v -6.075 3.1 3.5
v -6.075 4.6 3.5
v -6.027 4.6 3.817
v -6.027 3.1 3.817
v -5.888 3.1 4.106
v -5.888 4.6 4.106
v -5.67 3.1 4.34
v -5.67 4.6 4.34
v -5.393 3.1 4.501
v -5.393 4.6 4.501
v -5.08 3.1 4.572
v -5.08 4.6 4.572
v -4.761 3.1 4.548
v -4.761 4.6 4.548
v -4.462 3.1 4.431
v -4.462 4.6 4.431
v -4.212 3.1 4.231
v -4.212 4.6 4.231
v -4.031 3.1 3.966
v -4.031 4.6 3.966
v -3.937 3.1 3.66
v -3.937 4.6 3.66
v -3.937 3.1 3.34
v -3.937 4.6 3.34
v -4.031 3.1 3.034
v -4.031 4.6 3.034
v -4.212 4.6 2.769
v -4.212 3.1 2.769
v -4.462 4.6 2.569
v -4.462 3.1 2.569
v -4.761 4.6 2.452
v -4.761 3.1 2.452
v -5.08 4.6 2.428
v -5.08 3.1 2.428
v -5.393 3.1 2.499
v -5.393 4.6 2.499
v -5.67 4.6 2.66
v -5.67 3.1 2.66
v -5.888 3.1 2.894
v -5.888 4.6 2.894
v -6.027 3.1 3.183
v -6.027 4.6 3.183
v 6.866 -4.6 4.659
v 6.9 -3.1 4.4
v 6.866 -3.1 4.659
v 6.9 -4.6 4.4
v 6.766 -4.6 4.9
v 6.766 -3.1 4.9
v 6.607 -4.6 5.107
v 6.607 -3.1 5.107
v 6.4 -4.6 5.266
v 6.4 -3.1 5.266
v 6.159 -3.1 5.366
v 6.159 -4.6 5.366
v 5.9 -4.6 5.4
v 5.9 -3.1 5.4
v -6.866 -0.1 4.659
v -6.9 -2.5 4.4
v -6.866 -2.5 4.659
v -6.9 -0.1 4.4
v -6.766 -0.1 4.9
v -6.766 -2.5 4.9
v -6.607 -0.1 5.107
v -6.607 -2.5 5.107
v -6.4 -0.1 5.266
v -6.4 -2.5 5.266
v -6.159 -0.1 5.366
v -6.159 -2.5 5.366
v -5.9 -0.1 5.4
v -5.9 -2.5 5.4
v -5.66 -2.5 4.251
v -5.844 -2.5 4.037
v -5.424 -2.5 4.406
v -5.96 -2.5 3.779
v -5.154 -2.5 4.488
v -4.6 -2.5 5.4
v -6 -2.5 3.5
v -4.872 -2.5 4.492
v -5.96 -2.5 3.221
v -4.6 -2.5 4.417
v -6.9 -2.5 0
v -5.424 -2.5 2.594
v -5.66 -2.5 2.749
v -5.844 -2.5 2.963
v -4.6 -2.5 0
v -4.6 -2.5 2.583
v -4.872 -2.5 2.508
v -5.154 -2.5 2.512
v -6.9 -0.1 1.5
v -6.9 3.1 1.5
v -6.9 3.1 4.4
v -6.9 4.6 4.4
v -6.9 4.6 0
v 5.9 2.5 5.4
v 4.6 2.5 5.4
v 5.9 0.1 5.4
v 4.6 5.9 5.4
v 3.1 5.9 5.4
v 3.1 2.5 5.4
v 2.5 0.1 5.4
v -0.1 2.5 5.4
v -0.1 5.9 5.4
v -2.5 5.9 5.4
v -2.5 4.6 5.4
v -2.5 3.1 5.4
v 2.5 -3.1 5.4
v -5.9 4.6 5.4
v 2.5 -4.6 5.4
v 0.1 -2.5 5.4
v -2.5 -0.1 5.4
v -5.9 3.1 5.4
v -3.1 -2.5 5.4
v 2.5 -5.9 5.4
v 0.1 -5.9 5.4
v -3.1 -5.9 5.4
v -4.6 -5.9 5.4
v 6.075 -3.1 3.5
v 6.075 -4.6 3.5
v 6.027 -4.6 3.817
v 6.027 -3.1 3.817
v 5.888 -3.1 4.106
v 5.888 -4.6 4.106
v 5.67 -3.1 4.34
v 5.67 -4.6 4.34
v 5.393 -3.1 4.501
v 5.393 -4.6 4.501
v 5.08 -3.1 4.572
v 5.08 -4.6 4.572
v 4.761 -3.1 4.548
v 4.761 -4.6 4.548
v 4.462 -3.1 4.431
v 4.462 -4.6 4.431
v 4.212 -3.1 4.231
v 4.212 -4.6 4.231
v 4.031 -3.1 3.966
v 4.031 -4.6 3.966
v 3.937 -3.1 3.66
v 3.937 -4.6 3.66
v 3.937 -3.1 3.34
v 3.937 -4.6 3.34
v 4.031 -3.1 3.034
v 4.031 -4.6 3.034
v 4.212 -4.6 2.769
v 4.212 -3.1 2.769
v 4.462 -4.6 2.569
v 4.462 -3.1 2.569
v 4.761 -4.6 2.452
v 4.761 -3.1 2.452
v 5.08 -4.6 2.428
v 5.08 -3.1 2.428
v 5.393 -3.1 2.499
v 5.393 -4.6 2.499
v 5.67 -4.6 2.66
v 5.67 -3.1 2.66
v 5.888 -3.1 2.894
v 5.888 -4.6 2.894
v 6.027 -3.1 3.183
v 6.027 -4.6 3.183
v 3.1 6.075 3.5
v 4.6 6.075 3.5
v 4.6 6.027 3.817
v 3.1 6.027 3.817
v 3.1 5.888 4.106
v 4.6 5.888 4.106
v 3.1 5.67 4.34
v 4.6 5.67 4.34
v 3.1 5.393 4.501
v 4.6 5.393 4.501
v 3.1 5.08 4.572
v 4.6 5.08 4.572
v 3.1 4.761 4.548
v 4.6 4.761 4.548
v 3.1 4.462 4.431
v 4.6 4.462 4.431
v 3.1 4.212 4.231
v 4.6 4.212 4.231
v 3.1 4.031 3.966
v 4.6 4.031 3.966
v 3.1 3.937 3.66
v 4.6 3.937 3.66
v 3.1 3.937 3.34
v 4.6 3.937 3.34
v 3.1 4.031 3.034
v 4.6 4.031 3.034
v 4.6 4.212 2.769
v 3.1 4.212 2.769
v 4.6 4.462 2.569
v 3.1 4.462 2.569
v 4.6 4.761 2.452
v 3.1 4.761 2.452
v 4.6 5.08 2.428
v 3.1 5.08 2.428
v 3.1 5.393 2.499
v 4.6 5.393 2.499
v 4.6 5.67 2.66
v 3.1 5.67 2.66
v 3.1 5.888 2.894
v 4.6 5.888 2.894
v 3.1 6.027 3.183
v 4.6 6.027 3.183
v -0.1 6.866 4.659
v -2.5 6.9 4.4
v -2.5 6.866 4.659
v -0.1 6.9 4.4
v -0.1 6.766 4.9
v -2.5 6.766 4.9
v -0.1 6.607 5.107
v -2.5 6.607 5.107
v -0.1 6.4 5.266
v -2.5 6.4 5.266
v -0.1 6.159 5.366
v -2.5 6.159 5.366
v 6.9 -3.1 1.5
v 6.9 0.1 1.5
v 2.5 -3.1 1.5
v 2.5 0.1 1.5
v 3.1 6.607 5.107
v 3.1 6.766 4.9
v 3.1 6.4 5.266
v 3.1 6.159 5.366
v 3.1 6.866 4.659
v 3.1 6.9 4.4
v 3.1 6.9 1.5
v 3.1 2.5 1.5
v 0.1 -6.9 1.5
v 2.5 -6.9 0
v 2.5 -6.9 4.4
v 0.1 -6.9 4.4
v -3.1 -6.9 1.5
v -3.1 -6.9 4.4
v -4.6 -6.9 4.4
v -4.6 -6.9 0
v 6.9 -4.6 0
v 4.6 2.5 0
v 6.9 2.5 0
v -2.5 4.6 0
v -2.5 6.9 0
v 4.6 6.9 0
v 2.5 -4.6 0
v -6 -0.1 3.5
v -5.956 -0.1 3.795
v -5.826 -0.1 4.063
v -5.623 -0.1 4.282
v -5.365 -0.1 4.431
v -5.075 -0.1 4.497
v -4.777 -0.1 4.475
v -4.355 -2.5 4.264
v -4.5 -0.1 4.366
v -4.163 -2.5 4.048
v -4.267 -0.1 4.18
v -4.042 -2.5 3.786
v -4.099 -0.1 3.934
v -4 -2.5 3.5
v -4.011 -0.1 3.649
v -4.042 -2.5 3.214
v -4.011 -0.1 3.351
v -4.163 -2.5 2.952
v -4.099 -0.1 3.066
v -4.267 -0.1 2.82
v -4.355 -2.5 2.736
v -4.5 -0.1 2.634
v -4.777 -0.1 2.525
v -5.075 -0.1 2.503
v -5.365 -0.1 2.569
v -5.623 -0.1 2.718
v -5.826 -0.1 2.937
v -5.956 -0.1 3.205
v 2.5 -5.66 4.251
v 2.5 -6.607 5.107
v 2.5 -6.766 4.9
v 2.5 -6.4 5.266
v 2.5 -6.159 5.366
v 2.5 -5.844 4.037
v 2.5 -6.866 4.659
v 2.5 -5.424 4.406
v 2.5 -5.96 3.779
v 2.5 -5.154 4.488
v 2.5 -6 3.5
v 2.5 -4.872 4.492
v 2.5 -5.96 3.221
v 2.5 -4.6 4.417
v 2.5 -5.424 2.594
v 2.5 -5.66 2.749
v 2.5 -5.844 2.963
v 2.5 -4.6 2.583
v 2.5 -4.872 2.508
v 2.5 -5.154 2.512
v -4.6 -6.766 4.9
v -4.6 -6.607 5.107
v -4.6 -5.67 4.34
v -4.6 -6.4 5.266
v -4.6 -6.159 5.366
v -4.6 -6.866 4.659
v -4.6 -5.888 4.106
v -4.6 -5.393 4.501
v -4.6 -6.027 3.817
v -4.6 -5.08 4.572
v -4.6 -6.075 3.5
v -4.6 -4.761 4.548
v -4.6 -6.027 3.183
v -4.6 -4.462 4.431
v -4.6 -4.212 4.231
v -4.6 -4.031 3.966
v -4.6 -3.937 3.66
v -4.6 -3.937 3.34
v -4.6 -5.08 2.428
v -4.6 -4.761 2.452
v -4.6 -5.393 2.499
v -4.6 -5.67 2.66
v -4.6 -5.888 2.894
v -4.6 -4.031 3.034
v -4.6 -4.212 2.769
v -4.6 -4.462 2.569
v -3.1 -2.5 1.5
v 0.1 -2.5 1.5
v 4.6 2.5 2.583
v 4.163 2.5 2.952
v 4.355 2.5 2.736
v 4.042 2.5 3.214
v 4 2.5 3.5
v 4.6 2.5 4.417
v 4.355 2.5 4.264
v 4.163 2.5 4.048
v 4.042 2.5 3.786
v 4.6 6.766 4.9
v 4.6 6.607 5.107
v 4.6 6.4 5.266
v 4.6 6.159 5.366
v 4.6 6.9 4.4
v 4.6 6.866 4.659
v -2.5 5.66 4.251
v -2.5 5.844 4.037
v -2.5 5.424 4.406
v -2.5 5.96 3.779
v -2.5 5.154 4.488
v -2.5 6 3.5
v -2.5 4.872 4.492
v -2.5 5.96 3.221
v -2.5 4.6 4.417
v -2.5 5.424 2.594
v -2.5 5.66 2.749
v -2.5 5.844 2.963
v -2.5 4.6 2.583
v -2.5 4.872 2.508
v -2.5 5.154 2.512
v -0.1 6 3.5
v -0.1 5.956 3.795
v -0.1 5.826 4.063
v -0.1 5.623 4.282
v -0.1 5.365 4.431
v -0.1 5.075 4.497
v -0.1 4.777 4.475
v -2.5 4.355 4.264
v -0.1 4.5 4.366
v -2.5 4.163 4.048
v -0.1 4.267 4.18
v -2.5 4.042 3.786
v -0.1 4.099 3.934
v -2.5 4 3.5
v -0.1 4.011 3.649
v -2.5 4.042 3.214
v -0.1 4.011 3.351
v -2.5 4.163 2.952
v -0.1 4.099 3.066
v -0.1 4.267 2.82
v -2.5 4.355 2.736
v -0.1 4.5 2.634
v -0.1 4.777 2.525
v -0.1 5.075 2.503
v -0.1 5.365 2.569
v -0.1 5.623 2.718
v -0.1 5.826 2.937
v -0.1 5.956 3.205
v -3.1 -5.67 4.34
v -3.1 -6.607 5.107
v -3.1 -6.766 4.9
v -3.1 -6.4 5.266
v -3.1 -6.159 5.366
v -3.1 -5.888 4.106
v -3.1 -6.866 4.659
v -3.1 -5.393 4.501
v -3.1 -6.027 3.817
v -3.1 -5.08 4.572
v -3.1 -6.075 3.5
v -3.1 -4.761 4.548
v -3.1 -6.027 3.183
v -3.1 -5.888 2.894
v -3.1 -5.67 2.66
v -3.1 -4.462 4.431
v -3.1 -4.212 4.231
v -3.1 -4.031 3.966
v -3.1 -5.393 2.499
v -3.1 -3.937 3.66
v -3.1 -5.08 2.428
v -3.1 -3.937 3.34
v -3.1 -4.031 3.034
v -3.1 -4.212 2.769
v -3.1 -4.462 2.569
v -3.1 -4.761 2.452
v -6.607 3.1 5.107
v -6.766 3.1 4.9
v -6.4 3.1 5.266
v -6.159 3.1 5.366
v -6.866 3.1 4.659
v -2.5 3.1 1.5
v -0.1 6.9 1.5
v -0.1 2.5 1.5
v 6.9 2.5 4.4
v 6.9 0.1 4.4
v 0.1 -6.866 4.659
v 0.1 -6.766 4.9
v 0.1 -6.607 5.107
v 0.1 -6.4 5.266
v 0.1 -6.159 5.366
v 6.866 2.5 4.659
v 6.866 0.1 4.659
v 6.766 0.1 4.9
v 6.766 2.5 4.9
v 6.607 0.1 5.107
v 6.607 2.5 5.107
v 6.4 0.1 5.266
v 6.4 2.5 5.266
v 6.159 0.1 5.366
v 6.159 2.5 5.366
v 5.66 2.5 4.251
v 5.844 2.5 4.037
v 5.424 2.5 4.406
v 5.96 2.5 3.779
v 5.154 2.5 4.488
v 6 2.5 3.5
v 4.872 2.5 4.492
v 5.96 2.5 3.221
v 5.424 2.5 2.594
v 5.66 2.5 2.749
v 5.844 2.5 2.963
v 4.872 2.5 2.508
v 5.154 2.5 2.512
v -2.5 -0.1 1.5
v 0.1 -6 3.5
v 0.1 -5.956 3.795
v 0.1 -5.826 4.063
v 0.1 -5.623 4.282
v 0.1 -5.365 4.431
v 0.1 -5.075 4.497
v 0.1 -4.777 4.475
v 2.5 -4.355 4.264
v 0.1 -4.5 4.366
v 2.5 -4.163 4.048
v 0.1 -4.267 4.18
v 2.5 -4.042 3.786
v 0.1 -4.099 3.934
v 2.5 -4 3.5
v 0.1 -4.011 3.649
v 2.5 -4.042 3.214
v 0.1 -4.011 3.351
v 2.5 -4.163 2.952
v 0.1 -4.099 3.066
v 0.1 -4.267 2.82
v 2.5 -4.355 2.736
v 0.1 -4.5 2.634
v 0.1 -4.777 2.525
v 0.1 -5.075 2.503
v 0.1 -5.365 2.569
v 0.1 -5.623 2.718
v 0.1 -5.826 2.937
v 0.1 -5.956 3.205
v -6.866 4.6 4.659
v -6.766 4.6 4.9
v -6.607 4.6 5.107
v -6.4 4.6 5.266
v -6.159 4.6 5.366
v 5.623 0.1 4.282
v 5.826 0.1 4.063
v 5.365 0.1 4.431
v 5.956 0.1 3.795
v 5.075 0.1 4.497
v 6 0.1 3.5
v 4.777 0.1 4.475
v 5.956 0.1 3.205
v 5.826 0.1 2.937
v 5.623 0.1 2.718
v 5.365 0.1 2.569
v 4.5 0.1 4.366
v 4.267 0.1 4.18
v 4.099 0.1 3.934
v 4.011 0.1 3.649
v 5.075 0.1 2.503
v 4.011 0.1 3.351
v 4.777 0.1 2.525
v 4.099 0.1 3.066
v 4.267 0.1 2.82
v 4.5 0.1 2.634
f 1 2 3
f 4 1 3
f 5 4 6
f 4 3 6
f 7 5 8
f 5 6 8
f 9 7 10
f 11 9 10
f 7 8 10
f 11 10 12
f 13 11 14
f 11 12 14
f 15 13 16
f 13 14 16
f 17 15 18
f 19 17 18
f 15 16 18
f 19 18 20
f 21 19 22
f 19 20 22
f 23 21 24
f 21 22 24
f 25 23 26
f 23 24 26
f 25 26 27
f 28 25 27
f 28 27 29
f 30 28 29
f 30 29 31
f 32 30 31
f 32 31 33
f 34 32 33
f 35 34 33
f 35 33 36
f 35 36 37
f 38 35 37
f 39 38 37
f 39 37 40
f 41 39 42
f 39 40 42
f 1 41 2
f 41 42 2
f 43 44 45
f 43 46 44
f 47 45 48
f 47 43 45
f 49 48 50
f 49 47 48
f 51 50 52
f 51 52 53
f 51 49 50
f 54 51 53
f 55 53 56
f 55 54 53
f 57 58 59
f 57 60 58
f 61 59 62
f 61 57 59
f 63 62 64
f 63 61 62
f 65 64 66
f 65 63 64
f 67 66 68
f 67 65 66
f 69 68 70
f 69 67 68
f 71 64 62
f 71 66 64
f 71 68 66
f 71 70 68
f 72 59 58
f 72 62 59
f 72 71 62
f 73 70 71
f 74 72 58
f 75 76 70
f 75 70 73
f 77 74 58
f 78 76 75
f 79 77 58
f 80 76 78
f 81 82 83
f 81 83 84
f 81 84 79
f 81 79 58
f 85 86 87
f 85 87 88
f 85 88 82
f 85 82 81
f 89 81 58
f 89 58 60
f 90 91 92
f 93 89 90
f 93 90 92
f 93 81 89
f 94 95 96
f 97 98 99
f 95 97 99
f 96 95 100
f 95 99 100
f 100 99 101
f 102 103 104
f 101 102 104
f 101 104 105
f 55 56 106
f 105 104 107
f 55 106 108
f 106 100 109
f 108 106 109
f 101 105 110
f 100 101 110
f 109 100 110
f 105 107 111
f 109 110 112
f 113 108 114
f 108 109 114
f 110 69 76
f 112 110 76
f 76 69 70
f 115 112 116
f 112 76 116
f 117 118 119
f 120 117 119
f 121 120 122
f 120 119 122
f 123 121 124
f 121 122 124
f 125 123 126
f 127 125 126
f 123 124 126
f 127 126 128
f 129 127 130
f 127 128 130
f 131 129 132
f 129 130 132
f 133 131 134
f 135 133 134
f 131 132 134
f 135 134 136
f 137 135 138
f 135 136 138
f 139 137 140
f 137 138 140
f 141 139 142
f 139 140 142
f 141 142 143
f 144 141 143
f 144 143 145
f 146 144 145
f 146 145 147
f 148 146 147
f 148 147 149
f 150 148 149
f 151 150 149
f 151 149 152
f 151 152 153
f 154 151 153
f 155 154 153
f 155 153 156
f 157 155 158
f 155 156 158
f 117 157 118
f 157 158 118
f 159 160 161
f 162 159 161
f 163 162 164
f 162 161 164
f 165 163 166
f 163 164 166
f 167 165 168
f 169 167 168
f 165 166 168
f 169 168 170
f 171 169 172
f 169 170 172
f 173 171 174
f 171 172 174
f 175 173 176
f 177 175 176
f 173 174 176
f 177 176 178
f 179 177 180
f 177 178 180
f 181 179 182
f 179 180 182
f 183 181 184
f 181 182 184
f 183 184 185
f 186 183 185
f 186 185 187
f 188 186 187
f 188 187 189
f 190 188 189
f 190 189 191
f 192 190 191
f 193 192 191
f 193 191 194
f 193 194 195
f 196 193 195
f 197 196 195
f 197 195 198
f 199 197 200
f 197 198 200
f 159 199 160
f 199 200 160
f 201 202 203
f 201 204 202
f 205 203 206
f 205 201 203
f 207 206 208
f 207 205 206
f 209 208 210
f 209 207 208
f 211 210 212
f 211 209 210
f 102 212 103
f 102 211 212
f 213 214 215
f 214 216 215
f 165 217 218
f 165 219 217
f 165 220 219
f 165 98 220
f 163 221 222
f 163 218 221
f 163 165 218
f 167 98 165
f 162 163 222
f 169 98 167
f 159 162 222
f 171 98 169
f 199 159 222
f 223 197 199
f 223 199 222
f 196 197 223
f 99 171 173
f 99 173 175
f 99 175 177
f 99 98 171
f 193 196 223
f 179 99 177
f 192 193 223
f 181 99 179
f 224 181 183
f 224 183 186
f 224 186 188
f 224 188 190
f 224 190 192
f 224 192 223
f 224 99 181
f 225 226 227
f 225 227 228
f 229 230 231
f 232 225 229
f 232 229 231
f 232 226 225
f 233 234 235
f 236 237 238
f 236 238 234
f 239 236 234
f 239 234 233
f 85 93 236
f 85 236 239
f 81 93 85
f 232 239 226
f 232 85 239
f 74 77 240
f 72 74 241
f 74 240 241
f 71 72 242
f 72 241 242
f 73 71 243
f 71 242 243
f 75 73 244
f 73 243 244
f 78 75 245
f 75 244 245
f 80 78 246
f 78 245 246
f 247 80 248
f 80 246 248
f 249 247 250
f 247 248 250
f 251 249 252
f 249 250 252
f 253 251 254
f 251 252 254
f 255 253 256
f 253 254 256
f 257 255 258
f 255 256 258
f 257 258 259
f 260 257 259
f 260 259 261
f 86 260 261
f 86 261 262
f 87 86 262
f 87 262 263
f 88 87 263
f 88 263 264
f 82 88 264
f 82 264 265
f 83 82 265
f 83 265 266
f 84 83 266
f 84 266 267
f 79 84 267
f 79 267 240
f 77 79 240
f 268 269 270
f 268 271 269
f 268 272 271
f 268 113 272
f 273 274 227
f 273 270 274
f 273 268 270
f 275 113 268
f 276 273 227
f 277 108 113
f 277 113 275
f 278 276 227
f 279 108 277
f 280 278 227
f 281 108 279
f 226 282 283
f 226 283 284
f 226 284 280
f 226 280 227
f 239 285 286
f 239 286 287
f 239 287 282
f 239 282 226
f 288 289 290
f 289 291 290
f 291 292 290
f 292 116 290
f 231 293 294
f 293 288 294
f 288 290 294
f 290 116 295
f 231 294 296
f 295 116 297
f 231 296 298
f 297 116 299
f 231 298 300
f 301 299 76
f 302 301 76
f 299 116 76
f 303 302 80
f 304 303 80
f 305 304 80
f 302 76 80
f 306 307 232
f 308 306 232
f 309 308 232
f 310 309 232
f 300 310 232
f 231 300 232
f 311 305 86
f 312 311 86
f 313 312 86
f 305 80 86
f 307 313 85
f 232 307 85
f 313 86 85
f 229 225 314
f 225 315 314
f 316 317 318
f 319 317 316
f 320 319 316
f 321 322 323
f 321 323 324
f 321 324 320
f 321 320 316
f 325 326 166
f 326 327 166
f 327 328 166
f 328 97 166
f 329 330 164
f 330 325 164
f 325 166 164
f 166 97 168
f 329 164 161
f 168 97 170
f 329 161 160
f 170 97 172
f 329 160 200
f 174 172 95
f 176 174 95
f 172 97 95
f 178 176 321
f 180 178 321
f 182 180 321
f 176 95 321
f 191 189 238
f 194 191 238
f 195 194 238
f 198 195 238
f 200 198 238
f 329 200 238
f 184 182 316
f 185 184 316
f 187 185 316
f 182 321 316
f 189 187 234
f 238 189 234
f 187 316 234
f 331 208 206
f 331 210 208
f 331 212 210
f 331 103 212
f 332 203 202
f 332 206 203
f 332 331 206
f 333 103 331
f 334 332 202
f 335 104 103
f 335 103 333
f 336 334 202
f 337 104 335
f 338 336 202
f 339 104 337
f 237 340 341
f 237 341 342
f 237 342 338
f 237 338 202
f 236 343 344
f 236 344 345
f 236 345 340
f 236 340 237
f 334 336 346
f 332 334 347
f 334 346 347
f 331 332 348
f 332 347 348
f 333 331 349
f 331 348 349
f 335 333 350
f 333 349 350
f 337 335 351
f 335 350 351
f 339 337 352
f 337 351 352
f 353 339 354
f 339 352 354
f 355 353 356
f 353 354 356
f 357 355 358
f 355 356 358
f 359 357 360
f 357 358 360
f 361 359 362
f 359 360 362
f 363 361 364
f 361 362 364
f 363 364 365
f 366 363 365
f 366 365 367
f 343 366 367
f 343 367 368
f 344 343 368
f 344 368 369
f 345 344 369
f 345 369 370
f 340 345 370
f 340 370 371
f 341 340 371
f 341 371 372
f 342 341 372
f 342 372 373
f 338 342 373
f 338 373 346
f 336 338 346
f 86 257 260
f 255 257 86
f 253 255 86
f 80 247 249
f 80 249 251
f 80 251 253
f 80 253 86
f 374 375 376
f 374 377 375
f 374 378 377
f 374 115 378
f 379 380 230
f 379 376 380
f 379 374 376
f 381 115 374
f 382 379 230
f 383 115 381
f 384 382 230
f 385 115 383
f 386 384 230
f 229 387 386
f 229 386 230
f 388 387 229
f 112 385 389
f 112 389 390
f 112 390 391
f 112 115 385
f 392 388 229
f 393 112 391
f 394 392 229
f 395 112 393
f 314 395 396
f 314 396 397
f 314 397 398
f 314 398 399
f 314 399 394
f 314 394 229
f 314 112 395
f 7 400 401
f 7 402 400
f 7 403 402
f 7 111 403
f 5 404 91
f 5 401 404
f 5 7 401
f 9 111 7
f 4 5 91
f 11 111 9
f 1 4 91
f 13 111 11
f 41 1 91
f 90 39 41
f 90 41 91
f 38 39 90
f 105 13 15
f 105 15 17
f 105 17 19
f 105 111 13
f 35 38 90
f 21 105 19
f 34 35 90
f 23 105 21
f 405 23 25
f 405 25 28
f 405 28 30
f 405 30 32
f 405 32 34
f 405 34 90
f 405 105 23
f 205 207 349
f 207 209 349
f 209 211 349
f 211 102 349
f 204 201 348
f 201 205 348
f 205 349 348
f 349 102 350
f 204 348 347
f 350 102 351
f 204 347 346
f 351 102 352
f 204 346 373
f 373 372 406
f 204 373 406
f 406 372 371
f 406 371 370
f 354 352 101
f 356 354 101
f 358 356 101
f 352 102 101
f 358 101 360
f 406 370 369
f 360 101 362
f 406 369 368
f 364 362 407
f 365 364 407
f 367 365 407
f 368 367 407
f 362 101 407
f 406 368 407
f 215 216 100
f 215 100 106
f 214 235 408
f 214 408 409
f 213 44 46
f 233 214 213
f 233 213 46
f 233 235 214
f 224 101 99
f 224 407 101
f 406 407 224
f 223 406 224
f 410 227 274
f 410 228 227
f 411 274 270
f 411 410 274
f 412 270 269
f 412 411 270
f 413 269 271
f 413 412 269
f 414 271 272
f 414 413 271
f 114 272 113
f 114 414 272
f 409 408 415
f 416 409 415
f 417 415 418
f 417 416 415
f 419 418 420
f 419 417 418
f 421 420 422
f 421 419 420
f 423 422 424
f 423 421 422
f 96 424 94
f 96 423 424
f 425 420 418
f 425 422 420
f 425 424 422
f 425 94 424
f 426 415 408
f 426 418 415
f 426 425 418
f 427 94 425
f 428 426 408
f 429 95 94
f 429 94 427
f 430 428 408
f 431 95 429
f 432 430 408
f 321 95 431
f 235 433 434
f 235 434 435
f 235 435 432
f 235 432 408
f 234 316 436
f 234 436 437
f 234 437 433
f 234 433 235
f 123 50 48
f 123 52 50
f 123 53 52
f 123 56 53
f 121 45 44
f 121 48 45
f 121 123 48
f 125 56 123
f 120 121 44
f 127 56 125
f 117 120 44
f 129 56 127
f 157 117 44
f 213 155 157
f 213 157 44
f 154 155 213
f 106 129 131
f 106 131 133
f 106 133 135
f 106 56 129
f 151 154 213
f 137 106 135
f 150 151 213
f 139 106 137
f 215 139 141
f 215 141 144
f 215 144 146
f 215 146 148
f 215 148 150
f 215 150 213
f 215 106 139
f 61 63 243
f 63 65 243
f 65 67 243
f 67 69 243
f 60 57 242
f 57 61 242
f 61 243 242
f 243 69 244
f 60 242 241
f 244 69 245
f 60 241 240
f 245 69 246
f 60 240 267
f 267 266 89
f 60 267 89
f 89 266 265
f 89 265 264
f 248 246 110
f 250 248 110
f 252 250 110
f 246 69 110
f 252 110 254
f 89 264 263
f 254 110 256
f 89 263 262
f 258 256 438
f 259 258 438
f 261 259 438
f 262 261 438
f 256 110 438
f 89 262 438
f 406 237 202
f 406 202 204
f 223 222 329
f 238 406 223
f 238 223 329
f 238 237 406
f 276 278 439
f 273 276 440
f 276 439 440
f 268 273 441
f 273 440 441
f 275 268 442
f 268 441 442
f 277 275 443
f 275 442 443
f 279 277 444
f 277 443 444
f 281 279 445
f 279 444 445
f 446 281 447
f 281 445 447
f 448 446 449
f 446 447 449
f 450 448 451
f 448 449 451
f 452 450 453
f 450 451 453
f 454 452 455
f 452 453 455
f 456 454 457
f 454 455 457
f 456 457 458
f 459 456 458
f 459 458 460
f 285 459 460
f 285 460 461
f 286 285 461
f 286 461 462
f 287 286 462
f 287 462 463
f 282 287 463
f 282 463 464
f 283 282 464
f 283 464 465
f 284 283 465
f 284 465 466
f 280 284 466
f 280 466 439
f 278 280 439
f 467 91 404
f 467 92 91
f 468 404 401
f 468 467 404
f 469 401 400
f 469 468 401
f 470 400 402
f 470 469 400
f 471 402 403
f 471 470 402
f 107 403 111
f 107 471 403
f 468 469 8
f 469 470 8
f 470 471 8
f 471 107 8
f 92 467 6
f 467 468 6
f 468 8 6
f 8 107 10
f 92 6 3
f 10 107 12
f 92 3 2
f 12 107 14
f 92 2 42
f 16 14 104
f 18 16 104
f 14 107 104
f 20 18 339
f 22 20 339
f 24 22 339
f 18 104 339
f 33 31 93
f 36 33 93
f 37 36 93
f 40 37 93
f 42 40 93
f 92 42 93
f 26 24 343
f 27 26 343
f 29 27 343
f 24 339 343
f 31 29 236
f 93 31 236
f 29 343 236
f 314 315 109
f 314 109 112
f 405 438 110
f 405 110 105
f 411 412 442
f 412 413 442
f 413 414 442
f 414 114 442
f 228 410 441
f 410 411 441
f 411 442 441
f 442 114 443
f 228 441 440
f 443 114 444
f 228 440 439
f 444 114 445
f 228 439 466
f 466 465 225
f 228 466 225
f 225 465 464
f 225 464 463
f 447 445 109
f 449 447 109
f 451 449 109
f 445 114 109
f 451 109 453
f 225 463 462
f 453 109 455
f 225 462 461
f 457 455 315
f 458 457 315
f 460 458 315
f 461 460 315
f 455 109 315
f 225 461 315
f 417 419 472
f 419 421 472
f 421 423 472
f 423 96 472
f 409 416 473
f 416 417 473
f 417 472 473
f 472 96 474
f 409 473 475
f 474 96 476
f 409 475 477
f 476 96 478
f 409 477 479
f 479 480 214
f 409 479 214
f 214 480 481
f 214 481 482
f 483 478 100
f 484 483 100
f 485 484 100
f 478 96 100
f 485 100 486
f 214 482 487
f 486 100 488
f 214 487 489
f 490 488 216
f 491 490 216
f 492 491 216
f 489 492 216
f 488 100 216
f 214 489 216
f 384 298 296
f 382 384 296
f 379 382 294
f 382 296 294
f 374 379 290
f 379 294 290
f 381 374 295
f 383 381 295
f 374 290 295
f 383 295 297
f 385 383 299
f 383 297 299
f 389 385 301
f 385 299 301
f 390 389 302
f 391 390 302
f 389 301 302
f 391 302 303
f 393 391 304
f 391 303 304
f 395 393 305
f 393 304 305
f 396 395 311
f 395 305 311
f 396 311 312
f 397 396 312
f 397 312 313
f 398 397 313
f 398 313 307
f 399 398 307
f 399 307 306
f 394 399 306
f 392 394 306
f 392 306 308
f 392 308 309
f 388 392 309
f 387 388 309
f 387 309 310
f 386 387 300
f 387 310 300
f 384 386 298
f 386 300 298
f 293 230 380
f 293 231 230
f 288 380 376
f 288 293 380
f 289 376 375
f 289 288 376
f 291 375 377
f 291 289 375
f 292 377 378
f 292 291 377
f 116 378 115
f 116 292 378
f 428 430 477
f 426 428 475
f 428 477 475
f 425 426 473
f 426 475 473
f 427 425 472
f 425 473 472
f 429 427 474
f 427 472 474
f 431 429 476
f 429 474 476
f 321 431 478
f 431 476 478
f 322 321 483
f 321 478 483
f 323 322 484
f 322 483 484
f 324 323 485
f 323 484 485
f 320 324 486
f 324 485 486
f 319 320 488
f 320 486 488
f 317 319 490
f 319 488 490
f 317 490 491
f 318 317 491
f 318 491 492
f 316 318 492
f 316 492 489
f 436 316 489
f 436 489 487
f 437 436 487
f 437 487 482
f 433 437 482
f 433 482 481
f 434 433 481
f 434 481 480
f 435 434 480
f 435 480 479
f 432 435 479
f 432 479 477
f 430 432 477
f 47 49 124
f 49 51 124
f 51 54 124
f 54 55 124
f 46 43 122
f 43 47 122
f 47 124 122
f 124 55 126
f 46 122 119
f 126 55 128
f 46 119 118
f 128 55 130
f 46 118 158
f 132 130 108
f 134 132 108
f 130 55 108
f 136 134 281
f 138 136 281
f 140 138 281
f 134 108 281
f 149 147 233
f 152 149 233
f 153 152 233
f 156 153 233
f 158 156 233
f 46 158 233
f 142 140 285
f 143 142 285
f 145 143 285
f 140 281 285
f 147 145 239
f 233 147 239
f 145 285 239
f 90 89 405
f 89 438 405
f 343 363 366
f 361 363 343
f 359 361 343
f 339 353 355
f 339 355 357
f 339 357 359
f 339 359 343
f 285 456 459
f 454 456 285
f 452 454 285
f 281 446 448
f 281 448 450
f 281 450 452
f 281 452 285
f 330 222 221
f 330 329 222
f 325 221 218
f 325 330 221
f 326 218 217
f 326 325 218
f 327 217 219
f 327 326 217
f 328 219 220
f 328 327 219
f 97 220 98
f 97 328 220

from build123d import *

# Parameters (mm, degrees)
F0_W      = 13
F0_H      = 13
F1_DEPTH  = 5
F2_W      = 3.2
F2_H      = 4
F2_W_2    = 4
F2_H_2    = 3.2
F3_DEPTH  = 3.5
F4_W      = 4
F4_H      = 1.9
F4_W_2    = 1.9
F4_H_2    = 4
F5_DEPTH  = 5
F6_W      = 6.5
F6_H      = 6.5
F7_DEPTH  = 5
F10_DEPTH = 0.4
F11_DEPTH = 0.4
F12_DEPTH = 0.4
F8_R      = 1.075
F13_DEPTH = 1.5
F9_R      = 1
F14_DEPTH = 2.4
F15_COUNT = 4
F16_R     = 1


with BuildPart() as f1:
    # F0 (on Top) → F1 (new body)
    with BuildSketch(Plane.XY):
        Rectangle(F0_W, F0_H)
    extrude(amount=F1_DEPTH)

    # F2 (on face) → F3 (cut)
    with BuildSketch(Plane.XY.offset(5)):
        with Locations((1.5, 4.5)):
            Rectangle(F2_W, F2_H)
        with Locations((-4.5, 1.5)):
            Rectangle(F2_W_2, F2_H_2)
        with Locations((-1.5, -4.5)):
            Rectangle(F2_W, F2_H)
        with Locations((4.5, -1.5)):
            Rectangle(F2_W_2, F2_H_2)
    extrude(amount=-F3_DEPTH, mode=Mode.SUBTRACT)

    # F4 (on face) → F5 (cut, through all)
    with BuildSketch(Plane.XY.offset(5)):
        with Locations((-4.5, 5.55)):
            Rectangle(F4_W, F4_H)
        with Locations((-5.55, -4.5)):
            Rectangle(F4_W_2, F4_H_2)
        with Locations((4.5, -5.55)):
            Rectangle(F4_W, F4_H)
        with Locations((5.55, 4.5)):
            Rectangle(F4_W_2, F4_H_2)
    extrude(amount=-F5_DEPTH, mode=Mode.SUBTRACT)

    # F6 (on Top) → F7 (intersect, through all)
    with BuildSketch(Plane.XY):
        with Locations((-3.25, 3.25)):
            Rectangle(F6_W, F6_H)
    extrude(amount=F7_DEPTH, mode=Mode.INTERSECT)

    # F10 (add): a face of the model
    f10_faces = [f1.faces().sort_by_distance(p)[0] for p in [
        (-2.164416476, 3.3918764302, 5),
    ]]
    extrude(f10_faces, amount=F10_DEPTH)

    # F11 (add): a face of the model
    f11_faces = [f1.faces().sort_by_distance(p)[0] for p in [
        (-6.5, 2.3, 0.0709365914),
    ]]
    extrude(f11_faces, amount=F11_DEPTH)

    # F12 (add): a face of the model
    f12_faces = [f1.faces().sort_by_distance(p)[0] for p in [
        (-1.2856979405, 6.5, 2.6776887872),
    ]]
    extrude(f12_faces, amount=F12_DEPTH)

    # F8 (on face) → F13 (cut, through all)
    with BuildSketch(Plane(origin=(0, 4.6, 0), x_dir=(-1, 0, 0), z_dir=(0, 1, 0))):
        with Locations((5, 3.5)):
            Circle(F8_R)
    extrude(amount=-F13_DEPTH, mode=Mode.SUBTRACT)

    # F9 (on face) → F14 (cut, through all)
    with BuildSketch(Plane.YZ.offset(-0.1)):
        with Locations((5, 3.5)):
            Circle(F9_R)
    extrude(amount=-F14_DEPTH, mode=Mode.SUBTRACT)

    # F15: F1 ×4 about axis
    f15_axis = Axis((0, 0, 2.5), (0, 0, 1))


with BuildPart() as f1_1:
    add(f1.part)
    for i in range(1, F15_COUNT):
        add(f1.part.rotate(f15_axis, i * 360 / F15_COUNT))

    # F16
    f16_edges = [f1_1.edges().sort_by_distance(p)[0] for p in [
        (6.9, 1.3, 5.4),
        (-6.9, 3.85, 5.4),
        (-1.3, 6.9, 5.4),
        (-3.85, -6.9, 5.4),
        (-6.9, -1.3, 5.4),
        (6.9, -3.85, 5.4),
        (1.3, -6.9, 5.4),
        (3.85, 6.9, 5.4),
    ]]
    fillet(f16_edges, radius=F16_R)


solid = f1_1.part
